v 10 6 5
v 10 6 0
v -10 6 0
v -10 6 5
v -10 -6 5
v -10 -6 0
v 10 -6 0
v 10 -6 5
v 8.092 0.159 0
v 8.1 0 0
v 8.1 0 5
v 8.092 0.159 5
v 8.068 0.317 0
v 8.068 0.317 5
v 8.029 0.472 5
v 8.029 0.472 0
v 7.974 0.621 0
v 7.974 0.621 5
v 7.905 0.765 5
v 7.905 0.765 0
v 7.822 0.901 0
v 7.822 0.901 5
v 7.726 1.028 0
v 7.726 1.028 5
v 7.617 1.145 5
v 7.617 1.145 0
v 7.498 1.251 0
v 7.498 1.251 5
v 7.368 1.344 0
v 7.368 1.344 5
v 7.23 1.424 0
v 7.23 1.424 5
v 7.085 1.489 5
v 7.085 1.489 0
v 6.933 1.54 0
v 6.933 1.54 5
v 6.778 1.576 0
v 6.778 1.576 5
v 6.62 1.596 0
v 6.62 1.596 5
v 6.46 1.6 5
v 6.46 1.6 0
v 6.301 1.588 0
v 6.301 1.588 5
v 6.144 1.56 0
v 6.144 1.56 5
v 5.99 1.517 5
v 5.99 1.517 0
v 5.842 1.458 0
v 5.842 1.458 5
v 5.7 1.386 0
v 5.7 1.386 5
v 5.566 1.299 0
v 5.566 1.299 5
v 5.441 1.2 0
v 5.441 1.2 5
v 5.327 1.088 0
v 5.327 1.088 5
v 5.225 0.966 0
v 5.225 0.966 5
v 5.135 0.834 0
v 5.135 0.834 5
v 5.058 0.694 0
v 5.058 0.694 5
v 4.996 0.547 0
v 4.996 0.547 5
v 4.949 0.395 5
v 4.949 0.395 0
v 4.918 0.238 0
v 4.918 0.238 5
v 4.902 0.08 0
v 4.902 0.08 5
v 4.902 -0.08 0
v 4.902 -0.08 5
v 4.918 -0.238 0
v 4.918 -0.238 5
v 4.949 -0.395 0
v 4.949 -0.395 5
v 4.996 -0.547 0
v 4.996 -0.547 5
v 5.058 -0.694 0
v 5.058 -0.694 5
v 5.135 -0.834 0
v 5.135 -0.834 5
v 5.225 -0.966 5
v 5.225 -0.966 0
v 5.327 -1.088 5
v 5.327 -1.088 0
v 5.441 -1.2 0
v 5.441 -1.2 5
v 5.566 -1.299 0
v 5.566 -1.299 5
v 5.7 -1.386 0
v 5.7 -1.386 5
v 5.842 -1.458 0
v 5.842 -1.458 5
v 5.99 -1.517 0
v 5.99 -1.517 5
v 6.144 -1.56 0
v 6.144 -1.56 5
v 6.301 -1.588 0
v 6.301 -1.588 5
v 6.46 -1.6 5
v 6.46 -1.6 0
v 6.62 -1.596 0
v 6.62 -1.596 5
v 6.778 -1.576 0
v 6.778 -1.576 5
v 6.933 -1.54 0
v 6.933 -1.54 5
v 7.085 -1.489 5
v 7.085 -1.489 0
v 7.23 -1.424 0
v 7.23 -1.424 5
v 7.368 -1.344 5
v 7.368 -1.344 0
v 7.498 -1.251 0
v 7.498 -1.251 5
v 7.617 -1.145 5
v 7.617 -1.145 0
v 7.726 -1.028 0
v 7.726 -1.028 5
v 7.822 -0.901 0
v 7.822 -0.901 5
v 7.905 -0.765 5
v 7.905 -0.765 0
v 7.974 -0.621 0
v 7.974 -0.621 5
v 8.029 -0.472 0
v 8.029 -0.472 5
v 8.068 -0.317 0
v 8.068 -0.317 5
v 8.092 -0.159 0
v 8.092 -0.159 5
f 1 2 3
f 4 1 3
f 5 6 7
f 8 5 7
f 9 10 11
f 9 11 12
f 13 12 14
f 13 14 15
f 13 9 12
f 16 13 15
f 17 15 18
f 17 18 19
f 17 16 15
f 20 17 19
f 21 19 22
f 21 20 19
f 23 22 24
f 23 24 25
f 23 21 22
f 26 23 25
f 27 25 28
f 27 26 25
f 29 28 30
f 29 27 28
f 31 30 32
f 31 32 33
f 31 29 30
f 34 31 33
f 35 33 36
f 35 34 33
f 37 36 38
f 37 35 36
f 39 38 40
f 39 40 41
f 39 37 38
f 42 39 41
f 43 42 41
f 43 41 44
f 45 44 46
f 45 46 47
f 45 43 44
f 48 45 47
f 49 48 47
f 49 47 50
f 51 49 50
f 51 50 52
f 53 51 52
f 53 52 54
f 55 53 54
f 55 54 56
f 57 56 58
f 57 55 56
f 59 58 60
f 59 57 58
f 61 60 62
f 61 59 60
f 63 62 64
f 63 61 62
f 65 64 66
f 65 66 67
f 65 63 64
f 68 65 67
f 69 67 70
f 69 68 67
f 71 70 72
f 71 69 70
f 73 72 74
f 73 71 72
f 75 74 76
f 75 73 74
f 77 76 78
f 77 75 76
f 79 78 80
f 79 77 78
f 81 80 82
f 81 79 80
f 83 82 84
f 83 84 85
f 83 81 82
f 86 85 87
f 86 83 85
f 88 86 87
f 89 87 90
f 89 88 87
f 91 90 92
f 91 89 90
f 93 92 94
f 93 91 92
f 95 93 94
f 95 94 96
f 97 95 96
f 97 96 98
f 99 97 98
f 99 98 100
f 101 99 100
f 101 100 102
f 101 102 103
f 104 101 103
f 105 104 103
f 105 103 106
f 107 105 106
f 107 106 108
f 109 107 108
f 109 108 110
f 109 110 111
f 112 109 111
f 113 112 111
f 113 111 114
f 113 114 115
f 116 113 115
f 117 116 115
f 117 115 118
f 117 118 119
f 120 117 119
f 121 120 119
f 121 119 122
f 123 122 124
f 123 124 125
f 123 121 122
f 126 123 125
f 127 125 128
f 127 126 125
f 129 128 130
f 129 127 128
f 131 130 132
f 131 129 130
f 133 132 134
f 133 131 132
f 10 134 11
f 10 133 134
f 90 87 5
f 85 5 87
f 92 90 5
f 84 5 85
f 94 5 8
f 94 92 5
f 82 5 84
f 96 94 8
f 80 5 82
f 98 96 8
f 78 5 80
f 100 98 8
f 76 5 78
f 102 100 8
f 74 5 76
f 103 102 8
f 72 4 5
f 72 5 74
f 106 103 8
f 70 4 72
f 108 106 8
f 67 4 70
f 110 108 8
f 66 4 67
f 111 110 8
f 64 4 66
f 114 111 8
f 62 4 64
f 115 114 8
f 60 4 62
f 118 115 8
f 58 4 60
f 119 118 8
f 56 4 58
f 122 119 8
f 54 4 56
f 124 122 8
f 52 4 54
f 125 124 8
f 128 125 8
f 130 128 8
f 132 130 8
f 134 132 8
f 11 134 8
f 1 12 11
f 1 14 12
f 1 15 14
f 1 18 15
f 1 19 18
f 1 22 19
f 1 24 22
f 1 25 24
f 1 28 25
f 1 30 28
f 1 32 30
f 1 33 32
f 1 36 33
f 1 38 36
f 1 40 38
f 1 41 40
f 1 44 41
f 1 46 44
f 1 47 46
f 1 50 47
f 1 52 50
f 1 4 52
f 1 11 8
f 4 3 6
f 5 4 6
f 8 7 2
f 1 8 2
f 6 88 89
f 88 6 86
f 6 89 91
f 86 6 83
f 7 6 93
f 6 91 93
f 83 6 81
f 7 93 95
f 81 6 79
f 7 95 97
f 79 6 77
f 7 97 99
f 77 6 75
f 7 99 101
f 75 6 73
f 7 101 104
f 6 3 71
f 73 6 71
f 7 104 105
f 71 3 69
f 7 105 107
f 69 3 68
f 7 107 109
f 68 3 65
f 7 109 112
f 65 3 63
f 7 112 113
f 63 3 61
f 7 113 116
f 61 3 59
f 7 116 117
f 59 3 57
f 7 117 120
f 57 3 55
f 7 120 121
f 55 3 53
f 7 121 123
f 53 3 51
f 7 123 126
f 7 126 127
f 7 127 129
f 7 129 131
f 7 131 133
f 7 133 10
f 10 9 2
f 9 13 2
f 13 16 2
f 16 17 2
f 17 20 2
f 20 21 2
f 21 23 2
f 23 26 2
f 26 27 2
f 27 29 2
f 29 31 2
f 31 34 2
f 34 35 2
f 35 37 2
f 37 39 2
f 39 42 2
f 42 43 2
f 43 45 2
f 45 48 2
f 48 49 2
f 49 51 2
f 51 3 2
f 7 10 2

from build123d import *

# Parameters (mm, degrees)
F0_R     = 1.6
F1_DEPTH = 5


with BuildPart() as f1:
    # F0 (on Top) → F1 (new body)
    with BuildSketch(Plane.XY):
        with Locations((6.5, 0)):
            Circle(F0_R)
        Polygon((10, 0), (10, 6), (-10, 6), (-10, -6), (10, -6), align=None)
        with Locations((6.5, 0)):
            Circle(F0_R, mode=Mode.SUBTRACT)
    extrude(amount=F1_DEPTH)


solid = f1.part
